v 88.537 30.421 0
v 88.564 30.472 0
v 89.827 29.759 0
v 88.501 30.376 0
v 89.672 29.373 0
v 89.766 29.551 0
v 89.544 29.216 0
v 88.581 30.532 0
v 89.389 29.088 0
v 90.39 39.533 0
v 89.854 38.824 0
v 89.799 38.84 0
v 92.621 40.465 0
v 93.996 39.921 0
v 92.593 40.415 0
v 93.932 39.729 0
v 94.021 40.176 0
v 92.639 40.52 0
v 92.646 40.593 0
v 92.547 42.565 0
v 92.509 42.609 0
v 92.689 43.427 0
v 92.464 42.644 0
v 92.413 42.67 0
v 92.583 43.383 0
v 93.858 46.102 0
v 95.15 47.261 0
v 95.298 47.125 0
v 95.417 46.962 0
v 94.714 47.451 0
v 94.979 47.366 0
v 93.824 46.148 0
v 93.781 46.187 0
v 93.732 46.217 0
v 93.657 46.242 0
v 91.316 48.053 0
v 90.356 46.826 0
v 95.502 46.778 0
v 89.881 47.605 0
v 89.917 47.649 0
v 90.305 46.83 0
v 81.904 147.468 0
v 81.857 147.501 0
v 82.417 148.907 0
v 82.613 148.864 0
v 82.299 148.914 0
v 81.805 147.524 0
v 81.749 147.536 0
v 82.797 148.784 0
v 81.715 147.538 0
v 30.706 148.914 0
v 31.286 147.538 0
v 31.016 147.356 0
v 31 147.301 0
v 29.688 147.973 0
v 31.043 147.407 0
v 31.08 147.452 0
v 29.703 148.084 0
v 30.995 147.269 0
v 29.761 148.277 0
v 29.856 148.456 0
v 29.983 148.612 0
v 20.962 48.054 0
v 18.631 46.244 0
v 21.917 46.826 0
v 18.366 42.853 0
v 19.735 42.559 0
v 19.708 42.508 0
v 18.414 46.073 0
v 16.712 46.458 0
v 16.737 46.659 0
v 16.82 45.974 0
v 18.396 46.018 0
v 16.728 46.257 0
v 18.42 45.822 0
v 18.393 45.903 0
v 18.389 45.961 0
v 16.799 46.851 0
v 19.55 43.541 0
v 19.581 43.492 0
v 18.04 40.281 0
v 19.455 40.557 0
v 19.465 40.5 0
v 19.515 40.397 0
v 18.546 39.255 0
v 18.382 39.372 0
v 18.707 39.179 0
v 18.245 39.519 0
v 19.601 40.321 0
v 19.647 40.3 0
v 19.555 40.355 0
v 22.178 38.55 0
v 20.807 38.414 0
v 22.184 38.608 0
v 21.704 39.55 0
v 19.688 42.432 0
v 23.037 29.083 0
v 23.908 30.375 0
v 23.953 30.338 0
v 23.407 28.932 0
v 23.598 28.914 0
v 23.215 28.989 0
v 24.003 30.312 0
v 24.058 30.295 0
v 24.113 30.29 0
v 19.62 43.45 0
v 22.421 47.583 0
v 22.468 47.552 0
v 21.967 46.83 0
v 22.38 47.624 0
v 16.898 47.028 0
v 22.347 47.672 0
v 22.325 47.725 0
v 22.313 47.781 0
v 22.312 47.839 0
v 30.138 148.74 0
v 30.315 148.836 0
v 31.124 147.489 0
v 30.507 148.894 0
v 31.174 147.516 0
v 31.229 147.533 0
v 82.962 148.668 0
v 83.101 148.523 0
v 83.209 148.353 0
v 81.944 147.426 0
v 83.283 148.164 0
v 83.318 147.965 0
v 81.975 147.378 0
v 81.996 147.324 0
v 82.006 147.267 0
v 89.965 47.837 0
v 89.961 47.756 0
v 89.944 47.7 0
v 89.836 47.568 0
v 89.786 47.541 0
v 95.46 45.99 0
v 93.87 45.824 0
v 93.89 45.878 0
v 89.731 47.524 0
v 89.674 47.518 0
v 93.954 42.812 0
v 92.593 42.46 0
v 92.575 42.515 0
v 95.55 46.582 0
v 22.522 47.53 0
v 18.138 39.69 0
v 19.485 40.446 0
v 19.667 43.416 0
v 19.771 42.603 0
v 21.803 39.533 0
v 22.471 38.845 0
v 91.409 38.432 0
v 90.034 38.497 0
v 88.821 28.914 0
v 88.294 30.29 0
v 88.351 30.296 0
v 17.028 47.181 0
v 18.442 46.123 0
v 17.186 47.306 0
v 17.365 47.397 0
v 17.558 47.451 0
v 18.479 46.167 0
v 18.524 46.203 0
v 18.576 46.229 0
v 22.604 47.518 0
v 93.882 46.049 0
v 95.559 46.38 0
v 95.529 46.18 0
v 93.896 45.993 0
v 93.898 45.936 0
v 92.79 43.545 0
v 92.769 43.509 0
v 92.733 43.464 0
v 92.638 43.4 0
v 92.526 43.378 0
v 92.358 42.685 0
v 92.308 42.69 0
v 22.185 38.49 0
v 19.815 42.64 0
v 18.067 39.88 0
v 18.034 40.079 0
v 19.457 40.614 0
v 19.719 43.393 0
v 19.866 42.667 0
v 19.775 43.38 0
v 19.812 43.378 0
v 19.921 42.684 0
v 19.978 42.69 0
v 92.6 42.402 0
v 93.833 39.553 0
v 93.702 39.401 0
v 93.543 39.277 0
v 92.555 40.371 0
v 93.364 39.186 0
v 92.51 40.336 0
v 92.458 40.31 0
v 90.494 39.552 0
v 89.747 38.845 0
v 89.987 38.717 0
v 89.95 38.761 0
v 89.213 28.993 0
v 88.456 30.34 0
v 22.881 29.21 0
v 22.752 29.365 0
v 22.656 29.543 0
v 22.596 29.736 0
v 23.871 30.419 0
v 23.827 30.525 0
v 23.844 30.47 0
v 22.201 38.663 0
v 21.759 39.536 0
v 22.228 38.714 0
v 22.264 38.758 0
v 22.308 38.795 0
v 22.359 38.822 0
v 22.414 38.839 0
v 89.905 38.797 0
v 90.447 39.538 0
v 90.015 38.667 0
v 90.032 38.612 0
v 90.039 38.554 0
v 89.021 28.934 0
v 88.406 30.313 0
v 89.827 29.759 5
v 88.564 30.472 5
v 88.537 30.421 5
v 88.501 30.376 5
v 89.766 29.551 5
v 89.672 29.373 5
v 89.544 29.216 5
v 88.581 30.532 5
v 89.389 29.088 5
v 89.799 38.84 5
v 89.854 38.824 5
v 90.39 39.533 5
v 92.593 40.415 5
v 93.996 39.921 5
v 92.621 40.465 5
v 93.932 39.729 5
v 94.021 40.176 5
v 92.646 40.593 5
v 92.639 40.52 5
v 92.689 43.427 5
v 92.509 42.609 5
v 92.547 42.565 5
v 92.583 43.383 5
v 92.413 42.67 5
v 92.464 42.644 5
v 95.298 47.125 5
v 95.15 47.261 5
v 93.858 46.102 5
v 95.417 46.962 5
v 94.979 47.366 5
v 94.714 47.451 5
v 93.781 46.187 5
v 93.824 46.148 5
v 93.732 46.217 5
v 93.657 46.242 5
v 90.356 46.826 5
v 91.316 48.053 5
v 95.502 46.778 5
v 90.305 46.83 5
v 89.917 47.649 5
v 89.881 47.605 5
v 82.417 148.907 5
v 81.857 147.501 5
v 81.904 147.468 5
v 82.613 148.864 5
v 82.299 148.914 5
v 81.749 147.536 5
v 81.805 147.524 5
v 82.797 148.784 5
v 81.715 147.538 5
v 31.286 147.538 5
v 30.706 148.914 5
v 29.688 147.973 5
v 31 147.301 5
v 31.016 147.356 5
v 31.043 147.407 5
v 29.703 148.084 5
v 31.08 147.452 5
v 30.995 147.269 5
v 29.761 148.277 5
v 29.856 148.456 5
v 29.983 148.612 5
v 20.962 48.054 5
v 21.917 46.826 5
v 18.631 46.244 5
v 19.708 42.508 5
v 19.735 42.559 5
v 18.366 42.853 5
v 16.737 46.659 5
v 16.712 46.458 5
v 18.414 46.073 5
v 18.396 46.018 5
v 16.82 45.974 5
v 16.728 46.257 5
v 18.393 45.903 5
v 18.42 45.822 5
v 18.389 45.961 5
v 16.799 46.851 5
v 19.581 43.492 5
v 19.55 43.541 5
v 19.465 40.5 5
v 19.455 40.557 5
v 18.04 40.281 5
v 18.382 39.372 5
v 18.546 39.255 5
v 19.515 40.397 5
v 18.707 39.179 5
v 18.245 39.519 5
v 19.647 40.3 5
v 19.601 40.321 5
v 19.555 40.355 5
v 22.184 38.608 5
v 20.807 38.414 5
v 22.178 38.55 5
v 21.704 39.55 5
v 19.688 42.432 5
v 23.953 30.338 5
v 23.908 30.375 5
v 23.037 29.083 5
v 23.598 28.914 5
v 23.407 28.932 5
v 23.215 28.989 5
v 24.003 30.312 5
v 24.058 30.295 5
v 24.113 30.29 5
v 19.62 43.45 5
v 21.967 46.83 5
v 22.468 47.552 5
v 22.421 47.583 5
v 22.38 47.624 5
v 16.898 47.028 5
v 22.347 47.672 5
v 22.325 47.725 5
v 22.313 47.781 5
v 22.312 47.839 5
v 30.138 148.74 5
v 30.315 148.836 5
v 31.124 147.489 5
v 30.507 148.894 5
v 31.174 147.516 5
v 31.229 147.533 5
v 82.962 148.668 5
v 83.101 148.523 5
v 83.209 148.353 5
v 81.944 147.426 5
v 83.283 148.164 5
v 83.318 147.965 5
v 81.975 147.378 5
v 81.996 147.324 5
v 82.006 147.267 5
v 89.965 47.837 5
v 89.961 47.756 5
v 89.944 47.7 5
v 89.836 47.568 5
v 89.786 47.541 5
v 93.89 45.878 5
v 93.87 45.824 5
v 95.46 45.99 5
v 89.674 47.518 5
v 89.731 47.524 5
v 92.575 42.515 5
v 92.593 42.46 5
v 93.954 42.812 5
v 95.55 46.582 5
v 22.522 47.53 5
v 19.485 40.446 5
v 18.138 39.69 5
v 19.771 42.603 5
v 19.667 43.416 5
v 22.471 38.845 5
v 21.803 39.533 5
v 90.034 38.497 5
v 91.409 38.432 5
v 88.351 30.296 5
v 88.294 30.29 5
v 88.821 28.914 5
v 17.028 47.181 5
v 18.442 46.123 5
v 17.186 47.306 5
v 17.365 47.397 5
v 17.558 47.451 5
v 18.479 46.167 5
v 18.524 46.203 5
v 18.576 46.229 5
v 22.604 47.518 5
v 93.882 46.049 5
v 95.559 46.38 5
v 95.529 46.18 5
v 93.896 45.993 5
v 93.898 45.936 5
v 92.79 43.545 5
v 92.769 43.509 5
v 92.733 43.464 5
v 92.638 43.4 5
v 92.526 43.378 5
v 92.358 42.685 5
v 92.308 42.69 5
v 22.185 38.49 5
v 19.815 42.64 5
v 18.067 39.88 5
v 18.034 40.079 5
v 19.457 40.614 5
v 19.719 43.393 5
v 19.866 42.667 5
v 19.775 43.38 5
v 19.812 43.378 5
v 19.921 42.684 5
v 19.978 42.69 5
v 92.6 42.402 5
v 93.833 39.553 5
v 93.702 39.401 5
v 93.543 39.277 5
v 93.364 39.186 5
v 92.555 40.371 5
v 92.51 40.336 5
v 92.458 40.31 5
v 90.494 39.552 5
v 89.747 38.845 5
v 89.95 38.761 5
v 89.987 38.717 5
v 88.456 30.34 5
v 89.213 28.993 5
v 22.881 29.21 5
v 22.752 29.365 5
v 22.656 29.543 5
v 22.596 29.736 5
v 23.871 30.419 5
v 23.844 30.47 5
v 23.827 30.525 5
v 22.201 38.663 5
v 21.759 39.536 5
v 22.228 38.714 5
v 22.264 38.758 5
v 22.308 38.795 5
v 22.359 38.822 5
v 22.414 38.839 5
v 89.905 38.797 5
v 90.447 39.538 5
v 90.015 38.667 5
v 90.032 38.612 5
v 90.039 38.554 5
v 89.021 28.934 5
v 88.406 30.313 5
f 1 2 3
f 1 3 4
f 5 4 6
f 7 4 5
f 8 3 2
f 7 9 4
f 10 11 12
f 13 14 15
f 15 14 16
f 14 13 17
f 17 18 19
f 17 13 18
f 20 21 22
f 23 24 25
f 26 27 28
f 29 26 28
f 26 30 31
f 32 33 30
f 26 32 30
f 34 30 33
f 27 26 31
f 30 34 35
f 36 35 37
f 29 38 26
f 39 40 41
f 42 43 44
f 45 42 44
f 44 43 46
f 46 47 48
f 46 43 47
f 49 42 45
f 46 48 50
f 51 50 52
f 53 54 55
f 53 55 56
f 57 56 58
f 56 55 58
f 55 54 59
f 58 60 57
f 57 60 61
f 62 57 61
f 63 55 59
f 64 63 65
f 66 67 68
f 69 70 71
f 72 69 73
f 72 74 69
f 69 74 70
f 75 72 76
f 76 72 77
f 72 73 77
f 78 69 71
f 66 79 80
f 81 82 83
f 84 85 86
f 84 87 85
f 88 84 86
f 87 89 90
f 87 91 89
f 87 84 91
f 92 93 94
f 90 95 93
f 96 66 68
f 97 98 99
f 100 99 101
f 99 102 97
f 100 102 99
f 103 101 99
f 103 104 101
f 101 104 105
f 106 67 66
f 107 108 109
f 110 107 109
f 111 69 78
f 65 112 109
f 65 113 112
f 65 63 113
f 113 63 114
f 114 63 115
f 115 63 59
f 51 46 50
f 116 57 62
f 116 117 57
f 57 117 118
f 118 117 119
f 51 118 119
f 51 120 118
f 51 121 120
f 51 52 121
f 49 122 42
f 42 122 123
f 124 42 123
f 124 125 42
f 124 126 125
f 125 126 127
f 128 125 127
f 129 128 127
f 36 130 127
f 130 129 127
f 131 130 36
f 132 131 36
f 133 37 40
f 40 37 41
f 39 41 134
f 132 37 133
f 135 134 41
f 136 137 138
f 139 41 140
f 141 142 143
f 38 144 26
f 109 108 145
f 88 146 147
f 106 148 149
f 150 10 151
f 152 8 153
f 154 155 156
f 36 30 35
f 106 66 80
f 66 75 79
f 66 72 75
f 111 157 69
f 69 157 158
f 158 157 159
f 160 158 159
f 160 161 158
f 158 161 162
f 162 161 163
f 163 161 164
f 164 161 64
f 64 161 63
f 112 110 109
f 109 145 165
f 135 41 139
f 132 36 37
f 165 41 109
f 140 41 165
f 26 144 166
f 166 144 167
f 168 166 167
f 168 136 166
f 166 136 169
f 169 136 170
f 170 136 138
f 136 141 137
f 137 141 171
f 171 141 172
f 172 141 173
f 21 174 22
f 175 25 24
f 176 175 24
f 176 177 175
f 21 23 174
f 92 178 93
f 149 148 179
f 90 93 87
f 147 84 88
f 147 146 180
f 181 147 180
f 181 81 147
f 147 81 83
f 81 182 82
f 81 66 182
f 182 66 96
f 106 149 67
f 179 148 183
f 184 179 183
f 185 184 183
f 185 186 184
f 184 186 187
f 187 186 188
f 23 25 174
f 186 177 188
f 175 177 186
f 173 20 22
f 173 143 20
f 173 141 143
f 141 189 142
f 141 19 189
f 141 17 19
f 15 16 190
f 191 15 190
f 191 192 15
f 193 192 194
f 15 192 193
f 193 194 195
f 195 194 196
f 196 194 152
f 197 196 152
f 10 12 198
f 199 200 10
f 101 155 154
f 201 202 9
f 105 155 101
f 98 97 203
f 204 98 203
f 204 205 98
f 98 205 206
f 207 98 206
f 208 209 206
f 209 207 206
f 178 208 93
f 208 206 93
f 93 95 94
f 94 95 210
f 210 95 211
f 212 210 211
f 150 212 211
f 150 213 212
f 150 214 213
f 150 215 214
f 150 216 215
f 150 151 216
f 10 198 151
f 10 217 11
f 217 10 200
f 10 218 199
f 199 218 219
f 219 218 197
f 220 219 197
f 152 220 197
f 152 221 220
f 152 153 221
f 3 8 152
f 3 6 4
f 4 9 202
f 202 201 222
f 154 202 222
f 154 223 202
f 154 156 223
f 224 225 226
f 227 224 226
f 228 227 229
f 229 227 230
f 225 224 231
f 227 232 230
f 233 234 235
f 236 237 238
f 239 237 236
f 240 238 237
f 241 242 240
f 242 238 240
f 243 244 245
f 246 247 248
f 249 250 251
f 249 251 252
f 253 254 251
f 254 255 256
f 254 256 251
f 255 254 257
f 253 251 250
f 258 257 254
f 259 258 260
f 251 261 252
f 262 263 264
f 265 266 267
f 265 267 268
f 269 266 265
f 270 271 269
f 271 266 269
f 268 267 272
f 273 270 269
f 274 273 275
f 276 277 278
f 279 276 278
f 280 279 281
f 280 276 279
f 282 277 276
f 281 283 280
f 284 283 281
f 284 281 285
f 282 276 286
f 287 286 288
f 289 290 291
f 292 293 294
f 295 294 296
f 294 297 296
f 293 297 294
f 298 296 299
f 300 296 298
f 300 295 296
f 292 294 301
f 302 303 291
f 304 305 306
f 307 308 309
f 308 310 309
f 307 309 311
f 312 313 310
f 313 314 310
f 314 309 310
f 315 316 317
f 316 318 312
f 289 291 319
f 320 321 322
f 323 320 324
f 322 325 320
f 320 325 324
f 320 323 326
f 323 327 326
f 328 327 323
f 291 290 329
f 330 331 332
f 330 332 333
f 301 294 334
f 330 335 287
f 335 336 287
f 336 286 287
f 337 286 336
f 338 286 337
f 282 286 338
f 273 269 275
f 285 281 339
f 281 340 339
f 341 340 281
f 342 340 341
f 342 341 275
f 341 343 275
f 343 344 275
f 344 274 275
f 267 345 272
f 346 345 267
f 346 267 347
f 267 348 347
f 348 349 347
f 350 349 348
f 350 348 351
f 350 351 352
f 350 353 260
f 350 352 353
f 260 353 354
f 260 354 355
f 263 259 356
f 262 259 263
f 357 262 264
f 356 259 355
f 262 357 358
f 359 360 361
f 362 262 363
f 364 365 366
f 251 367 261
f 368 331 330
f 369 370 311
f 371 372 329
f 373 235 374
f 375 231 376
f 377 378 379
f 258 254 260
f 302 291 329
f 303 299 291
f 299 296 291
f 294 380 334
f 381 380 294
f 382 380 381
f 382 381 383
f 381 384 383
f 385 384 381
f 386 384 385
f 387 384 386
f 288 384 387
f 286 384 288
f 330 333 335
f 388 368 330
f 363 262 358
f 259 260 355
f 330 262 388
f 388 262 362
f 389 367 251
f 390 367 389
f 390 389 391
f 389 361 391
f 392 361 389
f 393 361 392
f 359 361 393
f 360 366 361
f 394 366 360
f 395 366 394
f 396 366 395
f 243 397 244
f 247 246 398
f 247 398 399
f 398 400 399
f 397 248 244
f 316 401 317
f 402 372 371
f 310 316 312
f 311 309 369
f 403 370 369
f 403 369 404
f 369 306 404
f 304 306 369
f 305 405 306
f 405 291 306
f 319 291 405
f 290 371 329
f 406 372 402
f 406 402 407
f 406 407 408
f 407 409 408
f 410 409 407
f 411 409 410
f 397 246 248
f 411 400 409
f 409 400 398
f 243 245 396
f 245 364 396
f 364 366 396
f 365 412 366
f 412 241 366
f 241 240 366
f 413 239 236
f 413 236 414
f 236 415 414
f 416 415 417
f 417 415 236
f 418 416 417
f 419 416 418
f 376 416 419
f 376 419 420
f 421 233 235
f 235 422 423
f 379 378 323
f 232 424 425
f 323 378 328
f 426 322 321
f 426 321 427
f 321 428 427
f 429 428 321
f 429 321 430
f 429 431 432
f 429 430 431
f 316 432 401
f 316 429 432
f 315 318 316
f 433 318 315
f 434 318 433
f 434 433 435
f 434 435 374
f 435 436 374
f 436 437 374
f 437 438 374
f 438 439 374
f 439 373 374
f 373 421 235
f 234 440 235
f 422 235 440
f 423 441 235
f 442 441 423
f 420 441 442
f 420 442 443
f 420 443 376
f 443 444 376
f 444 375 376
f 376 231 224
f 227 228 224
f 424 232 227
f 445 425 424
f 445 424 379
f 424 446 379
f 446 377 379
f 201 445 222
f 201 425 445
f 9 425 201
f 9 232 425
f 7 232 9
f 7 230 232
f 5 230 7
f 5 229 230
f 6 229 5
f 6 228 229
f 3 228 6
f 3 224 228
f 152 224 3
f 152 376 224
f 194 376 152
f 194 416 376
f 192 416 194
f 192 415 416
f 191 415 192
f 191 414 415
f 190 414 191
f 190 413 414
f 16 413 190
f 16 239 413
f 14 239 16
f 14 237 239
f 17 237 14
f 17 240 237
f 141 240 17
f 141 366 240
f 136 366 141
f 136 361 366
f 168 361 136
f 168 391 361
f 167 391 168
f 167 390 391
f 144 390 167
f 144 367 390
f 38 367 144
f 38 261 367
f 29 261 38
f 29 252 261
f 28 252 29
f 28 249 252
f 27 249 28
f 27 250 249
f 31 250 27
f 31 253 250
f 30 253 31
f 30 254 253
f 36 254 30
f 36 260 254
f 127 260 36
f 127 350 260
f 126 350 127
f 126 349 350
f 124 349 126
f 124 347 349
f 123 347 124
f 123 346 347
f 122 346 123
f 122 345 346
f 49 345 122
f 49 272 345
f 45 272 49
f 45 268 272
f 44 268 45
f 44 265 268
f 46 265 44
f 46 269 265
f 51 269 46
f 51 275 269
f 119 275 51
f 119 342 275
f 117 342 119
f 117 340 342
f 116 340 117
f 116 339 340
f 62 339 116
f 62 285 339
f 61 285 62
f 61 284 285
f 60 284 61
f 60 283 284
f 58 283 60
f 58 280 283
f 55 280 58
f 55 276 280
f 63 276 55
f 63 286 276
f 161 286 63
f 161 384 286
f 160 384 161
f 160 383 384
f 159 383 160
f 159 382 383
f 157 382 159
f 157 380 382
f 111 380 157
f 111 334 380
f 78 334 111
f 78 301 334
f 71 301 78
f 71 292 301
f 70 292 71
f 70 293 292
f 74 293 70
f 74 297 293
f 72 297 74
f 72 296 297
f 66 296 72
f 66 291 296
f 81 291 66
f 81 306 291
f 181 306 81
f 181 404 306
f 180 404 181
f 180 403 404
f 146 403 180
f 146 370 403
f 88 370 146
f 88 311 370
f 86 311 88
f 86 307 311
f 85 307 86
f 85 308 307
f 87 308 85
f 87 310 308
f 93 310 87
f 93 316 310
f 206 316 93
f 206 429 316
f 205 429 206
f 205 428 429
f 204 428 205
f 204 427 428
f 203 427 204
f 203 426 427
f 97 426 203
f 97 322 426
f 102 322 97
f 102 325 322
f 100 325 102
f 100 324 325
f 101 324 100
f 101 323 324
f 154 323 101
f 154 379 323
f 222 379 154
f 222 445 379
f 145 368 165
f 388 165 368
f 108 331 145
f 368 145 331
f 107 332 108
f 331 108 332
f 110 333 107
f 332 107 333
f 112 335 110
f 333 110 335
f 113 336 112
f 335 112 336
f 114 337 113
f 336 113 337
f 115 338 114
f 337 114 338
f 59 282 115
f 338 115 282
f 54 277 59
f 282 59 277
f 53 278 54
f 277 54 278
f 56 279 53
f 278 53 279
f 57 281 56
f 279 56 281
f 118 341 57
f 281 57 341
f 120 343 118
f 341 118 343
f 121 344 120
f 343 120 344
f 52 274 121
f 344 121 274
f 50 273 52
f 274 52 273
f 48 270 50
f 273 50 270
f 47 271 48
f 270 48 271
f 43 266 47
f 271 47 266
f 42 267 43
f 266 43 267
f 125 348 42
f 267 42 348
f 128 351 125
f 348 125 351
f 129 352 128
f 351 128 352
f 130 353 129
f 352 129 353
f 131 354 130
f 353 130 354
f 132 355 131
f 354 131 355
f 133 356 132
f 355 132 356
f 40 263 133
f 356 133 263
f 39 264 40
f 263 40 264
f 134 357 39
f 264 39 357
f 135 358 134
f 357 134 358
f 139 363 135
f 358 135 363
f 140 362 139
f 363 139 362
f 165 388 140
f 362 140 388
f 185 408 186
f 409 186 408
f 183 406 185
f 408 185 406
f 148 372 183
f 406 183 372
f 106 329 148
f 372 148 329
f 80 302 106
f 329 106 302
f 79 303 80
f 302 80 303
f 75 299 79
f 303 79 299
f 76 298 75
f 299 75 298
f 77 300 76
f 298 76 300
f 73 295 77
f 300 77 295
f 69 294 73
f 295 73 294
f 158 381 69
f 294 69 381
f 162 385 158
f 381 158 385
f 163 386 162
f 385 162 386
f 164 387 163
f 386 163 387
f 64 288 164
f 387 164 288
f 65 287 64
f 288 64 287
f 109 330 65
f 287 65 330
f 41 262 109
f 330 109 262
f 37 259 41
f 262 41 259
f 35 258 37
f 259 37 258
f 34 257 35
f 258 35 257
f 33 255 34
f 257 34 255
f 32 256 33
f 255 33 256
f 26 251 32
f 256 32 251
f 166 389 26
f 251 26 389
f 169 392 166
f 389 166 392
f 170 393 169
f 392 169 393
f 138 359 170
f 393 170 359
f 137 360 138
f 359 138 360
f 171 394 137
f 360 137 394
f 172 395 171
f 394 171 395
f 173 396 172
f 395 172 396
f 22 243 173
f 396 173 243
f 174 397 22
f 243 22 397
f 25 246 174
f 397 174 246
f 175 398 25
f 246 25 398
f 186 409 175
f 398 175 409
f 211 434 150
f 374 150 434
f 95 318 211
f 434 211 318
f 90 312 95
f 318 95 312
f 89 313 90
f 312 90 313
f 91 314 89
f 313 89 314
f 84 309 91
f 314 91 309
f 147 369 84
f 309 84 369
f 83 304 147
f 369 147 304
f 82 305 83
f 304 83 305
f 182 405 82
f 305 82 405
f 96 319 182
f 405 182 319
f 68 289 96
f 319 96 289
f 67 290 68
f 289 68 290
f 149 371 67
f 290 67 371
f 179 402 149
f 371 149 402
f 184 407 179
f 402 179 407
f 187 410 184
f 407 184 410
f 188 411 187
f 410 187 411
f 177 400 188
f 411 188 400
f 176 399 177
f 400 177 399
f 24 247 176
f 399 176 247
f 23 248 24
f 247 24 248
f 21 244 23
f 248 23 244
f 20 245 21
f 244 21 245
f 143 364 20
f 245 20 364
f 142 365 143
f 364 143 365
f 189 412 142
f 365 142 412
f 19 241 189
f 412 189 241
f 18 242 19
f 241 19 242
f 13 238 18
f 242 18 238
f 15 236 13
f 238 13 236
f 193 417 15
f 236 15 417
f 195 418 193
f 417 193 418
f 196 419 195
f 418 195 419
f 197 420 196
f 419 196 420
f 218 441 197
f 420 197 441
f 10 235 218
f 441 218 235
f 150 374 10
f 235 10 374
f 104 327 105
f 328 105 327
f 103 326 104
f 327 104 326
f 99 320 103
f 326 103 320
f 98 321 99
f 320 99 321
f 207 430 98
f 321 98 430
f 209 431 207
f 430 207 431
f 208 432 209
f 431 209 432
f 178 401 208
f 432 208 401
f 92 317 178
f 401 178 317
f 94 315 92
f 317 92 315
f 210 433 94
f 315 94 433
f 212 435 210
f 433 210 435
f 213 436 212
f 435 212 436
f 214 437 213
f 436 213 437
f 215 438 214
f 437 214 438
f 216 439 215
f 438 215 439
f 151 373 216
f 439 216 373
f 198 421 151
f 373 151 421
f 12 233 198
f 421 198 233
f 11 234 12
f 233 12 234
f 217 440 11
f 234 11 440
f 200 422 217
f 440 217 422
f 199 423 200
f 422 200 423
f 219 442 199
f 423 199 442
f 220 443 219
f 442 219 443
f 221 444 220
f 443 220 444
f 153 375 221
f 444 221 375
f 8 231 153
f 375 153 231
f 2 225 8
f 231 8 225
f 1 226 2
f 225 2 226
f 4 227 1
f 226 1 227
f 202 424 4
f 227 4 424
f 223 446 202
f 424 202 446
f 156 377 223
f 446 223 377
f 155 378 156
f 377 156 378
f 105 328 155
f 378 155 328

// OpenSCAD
/*
 * Customizable Origami - Disposable Coffee Cup - https://www.thingiverse.com/thing:2709481
 * by Dennis Hofmann - https://www.thingiverse.com/mightynozzle/about
 * created 2017-12-12
 * version v1.0
 *
 * Changelog
 * --------------
 * v1.0:
 *      - final design
 * --------------
 * 
 * This work is licensed under the Creative Commons - Attribution - NonCommercial - ShareAlike license.
 * https://creativecommons.org/licenses/by-nc-sa/3.0/
 */


 // Parameter Section //
//-------------------//

// preview[view:north, tilt:top]

// The maximum size of the longest side. The shorter side will be automatically resized in same ratio.
max_size_in_millimeter = 120; //[20:300]

// The height of the model.
model_height_in_millimeter = 5; //[0.2:0.2:100]

// Thickness of the outer outline.
outline_size_in_millimeter = 1.4; //[0.5:0.1:20]

// Thickness of the inner outline.
inline_size_in_millimeter = 0.7; //[0.5:0.1:20]

// Roundiness of the ends of the inner outlines.
inline_edge_radius_in_millimeter = 0.3; //[0.0:0.1:5]

// Flip model
flip_model = "no"; //[yes,no]

/*[hidden]*/
max_size = max_size_in_millimeter;
model_height = model_height_in_millimeter;
$fn=32;

// Outer Points
A1 = [296, 530];
A2 = [322, 405];
A3 = [1212, 405];
A4 = [1235, 530];
A5 = [1269, 543];
A6 = [1268, 582];
A7 = [1290, 628];
A8 = [1233, 638];
A9 = [1123, 2000];
A10 = [419, 2000];
A11 = [299, 638];
A12 = [242, 628];
A13 = [265, 582];
A14 = [260, 543];

outline = [A1, A2, A3, A4, A5, A6, A7, A8, A9, A10, A11, A12, A13, A14];

// Inner Points

// Polygons
C1 = [A2, A3, A4, A1];
C2 = [A4, A5, A6, A13, A14, A1];
C3 = [A6, A7, A8, A11, A12, A13];
C4 = [A8, A9, A10, A11];

cut_polygons = [C1, C2, C3, C4];

min_x = A12[0];
min_y = A2[1];
max_x = A7[0];
max_y = A10[1];

x_size = max_x - min_x;
y_size = max_y - min_y;

x_factor = max_size / x_size;
y_factor = max_size / y_size;

inline_size = x_size > y_size ? inline_size_in_millimeter / x_factor / 2: inline_size_in_millimeter / y_factor / 2;
inline_edge_radius = x_size > y_size ? inline_edge_radius_in_millimeter / x_factor: inline_edge_radius_in_millimeter / y_factor;
outline_size = x_size > y_size ? outline_size_in_millimeter / x_factor - inline_size: outline_size_in_millimeter / y_factor - inline_size;


 // Program Section //
//-----------------//

if(x_size > y_size) {
    resize(newsize=[max_size, x_factor * y_size, model_height]){
        if(flip_model == "yes") {
            mirror([0,1,0]) {
                rotate([180,180,0]) {    
                    create(outline, cut_polygons);
                }
            }
        } else {
            create(outline, cut_polygons);
        }
    }
} else {
    resize(newsize=[y_factor * x_size, max_size, model_height]){
        if(flip_model == "yes") {
            mirror([0,1,0]) {
                rotate([180,180,0]) {    
                    create(outline, cut_polygons);
                }
            }
        } else {
            create(outline, cut_polygons);
        }
    }
}


 // Module Section //
//----------------//

module create() {
    linear_extrude(height=1) {
        difference() {
            offset(r = -0) {
                offset(r = +outline_size) {
                    polygon(points = outline, convexity = 10);
                }
            }
            
            for(cut_polygon = [0:len(cut_polygons)]) {
                offset(r = +inline_edge_radius) {
                    offset(r = -inline_size - inline_edge_radius) {
                        polygon(points = cut_polygons[cut_polygon], convexity = 10);
                    }
                }
            }
        }
    }
}
